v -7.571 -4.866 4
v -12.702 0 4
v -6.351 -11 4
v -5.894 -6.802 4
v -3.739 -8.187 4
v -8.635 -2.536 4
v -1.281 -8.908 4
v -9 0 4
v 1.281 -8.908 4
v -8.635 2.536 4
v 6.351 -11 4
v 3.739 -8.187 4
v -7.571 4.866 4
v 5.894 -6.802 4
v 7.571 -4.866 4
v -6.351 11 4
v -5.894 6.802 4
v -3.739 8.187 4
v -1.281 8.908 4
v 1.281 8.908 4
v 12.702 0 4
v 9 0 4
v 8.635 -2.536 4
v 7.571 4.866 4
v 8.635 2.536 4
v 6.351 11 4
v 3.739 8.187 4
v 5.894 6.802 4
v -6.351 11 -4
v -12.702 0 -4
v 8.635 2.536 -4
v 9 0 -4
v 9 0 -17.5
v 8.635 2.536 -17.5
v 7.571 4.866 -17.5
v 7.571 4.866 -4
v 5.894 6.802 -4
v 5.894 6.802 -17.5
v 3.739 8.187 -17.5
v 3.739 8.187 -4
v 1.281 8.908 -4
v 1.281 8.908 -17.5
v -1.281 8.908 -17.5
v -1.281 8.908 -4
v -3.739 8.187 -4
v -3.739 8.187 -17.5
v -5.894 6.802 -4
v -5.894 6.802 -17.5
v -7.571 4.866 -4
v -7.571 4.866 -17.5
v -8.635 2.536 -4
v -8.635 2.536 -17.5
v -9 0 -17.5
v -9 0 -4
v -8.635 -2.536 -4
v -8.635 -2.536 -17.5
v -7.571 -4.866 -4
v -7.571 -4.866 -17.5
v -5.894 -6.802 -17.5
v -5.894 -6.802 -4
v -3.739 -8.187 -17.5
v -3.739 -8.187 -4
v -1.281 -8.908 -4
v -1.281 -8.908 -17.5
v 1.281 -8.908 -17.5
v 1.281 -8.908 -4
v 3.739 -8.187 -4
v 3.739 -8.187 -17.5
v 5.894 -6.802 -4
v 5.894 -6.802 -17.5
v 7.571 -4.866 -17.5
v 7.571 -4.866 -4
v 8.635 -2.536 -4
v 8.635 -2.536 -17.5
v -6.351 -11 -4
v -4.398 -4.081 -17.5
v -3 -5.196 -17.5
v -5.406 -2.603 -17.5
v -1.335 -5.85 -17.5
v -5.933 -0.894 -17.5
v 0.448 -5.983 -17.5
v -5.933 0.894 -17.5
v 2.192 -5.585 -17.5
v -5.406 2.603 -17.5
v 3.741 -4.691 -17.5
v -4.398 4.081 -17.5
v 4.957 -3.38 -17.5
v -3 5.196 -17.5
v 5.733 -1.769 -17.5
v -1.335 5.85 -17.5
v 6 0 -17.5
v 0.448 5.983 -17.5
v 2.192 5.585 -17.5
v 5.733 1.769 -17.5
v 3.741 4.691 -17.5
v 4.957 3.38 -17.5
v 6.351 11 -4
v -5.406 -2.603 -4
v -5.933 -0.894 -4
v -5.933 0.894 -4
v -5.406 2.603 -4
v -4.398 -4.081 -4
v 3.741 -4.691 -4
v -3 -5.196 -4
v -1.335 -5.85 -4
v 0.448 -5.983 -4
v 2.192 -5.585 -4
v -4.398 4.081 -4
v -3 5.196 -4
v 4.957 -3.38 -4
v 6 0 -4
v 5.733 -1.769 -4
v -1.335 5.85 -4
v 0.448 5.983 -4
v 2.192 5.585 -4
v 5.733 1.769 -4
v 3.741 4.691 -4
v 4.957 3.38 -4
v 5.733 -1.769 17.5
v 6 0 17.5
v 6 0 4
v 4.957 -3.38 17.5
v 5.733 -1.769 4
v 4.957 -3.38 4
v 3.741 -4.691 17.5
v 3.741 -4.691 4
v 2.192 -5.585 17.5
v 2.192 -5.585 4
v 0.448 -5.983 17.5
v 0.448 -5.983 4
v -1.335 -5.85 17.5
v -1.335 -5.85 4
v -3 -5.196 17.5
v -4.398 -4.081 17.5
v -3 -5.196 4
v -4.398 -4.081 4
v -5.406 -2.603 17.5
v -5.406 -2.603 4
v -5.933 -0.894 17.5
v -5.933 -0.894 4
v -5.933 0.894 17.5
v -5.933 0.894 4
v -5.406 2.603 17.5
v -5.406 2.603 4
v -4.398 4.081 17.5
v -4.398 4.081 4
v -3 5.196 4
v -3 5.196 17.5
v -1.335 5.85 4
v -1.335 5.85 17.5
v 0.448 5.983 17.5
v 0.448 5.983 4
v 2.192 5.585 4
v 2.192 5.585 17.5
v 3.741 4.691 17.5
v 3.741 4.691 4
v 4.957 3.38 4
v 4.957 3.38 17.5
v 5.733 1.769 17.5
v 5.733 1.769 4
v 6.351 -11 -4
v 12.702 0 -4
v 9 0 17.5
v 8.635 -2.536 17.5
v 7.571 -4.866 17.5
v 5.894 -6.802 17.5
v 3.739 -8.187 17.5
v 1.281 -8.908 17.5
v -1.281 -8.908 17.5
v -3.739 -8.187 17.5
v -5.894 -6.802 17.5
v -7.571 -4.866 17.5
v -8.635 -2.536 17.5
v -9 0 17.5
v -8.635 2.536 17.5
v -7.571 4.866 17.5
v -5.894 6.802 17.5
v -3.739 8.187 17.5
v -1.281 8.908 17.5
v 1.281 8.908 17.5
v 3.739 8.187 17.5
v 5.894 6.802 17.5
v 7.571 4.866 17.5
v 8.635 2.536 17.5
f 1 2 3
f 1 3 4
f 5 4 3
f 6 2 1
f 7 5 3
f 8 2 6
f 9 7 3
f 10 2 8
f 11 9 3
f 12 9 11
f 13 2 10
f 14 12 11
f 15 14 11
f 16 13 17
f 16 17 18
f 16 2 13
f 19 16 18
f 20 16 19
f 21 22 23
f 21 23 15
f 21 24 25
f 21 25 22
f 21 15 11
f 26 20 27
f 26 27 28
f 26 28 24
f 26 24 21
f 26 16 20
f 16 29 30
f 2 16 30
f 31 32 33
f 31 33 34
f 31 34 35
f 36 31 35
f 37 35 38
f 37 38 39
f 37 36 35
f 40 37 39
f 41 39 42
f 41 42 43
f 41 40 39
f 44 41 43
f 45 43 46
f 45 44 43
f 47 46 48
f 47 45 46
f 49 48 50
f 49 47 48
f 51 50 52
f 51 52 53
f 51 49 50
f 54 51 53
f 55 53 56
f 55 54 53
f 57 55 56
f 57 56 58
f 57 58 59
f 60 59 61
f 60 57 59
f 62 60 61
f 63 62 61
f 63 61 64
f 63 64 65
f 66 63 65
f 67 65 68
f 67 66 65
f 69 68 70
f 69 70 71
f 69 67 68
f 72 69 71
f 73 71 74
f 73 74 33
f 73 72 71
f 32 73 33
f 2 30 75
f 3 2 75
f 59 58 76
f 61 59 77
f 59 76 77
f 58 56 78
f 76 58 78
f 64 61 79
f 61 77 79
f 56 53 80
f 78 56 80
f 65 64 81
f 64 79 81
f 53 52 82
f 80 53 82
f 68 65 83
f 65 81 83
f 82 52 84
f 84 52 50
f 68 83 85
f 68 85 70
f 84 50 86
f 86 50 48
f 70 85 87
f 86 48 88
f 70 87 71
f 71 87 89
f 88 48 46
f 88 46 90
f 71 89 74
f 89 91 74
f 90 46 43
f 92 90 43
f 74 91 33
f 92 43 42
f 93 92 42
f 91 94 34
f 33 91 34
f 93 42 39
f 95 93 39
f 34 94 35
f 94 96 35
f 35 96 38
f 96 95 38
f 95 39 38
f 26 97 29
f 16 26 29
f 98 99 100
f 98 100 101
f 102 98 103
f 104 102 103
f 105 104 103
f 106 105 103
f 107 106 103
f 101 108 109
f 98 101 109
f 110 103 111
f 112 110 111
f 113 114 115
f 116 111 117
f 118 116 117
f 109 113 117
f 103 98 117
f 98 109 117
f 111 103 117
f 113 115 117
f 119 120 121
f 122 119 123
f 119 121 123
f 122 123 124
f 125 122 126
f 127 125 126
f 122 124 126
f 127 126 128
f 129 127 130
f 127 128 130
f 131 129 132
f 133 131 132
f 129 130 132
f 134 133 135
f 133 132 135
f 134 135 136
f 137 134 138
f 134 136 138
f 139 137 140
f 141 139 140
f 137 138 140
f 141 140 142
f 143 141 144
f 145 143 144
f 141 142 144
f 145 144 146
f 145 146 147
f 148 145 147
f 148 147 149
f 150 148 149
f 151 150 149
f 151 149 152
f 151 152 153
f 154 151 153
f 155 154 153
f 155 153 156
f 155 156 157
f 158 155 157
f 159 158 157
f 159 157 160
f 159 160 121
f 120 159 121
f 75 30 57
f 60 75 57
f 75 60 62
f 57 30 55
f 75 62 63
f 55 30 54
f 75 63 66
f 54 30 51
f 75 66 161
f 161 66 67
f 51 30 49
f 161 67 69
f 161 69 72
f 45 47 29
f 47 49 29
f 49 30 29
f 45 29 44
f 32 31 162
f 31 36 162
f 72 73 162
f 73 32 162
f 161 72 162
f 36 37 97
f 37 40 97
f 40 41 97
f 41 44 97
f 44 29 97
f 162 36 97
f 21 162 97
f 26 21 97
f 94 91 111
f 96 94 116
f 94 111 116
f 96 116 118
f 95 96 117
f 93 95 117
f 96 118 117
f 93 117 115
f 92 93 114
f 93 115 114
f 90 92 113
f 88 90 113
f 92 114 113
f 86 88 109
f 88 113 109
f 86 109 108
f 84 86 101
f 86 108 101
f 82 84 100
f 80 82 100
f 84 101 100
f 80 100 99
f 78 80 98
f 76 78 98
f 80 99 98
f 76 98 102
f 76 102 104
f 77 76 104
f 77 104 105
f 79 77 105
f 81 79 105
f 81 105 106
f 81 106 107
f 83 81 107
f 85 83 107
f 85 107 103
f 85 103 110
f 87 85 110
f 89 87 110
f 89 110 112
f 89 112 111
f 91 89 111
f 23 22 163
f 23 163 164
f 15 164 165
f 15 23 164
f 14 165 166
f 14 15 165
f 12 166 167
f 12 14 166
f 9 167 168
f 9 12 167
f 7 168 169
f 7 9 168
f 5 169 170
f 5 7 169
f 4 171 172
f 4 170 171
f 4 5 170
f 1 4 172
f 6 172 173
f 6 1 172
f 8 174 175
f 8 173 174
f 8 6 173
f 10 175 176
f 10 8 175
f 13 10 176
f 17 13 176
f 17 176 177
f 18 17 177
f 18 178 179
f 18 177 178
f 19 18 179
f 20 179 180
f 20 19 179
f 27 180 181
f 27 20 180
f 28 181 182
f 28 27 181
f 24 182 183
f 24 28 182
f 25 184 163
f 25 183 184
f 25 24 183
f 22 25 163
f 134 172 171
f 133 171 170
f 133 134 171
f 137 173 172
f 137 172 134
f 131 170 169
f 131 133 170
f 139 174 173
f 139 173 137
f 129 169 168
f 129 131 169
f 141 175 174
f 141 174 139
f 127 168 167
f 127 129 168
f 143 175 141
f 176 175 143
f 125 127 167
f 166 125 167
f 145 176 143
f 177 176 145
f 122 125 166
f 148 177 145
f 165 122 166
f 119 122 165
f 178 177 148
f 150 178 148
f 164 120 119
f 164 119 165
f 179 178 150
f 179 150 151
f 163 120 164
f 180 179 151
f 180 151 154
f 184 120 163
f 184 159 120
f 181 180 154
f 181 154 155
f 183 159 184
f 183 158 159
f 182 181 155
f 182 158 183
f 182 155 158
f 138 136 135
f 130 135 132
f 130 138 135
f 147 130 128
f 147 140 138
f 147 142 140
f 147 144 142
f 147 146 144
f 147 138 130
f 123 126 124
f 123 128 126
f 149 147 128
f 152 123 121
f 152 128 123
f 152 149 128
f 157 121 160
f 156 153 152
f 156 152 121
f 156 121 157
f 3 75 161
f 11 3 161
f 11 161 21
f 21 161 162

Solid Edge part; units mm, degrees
sketch "Sketch1" plane through (0, 0, 0) normal (0, 0, 1) x (1, 0, 0)
  circle A0 centre (0, 0) radius 9
  dimension "D1" = 18
extrude "Protrusion1" add sketch "Sketch1" along normal mid plane 35
sketch "Sketch2" plane through (0, 0, 0) normal (0, 0, 1) x (1, 0, 0)
  circle A0 centre (0, 0) radius 6
  dimension "D1" = 12
extrude "Cutout1" cut sketch "Sketch2" along normal through all and the other way through all
sketch "Sketch3" plane through (0, 0, 0) normal (0, 0, 1) x (1, 0, 0)
  line L0 (6.3509, 11) -> (-6.3509, 11)
  line L1 (-6.3509, 11) -> (-12.7017, 0)
  line L2 (-12.7017, 0) -> (-6.3509, -11)
  line L3 (-6.3509, -11) -> (6.3509, -11)
  line L4 (6.3509, -11) -> (12.7017, 0)
  line L5 (12.7017, 0) -> (6.3509, 11)
  dimension "D1" = 11
  dimension "D2" = 22
extrude "ExtrudedProtrusion_2" add sketch "Sketch3" along normal mid plane 8
